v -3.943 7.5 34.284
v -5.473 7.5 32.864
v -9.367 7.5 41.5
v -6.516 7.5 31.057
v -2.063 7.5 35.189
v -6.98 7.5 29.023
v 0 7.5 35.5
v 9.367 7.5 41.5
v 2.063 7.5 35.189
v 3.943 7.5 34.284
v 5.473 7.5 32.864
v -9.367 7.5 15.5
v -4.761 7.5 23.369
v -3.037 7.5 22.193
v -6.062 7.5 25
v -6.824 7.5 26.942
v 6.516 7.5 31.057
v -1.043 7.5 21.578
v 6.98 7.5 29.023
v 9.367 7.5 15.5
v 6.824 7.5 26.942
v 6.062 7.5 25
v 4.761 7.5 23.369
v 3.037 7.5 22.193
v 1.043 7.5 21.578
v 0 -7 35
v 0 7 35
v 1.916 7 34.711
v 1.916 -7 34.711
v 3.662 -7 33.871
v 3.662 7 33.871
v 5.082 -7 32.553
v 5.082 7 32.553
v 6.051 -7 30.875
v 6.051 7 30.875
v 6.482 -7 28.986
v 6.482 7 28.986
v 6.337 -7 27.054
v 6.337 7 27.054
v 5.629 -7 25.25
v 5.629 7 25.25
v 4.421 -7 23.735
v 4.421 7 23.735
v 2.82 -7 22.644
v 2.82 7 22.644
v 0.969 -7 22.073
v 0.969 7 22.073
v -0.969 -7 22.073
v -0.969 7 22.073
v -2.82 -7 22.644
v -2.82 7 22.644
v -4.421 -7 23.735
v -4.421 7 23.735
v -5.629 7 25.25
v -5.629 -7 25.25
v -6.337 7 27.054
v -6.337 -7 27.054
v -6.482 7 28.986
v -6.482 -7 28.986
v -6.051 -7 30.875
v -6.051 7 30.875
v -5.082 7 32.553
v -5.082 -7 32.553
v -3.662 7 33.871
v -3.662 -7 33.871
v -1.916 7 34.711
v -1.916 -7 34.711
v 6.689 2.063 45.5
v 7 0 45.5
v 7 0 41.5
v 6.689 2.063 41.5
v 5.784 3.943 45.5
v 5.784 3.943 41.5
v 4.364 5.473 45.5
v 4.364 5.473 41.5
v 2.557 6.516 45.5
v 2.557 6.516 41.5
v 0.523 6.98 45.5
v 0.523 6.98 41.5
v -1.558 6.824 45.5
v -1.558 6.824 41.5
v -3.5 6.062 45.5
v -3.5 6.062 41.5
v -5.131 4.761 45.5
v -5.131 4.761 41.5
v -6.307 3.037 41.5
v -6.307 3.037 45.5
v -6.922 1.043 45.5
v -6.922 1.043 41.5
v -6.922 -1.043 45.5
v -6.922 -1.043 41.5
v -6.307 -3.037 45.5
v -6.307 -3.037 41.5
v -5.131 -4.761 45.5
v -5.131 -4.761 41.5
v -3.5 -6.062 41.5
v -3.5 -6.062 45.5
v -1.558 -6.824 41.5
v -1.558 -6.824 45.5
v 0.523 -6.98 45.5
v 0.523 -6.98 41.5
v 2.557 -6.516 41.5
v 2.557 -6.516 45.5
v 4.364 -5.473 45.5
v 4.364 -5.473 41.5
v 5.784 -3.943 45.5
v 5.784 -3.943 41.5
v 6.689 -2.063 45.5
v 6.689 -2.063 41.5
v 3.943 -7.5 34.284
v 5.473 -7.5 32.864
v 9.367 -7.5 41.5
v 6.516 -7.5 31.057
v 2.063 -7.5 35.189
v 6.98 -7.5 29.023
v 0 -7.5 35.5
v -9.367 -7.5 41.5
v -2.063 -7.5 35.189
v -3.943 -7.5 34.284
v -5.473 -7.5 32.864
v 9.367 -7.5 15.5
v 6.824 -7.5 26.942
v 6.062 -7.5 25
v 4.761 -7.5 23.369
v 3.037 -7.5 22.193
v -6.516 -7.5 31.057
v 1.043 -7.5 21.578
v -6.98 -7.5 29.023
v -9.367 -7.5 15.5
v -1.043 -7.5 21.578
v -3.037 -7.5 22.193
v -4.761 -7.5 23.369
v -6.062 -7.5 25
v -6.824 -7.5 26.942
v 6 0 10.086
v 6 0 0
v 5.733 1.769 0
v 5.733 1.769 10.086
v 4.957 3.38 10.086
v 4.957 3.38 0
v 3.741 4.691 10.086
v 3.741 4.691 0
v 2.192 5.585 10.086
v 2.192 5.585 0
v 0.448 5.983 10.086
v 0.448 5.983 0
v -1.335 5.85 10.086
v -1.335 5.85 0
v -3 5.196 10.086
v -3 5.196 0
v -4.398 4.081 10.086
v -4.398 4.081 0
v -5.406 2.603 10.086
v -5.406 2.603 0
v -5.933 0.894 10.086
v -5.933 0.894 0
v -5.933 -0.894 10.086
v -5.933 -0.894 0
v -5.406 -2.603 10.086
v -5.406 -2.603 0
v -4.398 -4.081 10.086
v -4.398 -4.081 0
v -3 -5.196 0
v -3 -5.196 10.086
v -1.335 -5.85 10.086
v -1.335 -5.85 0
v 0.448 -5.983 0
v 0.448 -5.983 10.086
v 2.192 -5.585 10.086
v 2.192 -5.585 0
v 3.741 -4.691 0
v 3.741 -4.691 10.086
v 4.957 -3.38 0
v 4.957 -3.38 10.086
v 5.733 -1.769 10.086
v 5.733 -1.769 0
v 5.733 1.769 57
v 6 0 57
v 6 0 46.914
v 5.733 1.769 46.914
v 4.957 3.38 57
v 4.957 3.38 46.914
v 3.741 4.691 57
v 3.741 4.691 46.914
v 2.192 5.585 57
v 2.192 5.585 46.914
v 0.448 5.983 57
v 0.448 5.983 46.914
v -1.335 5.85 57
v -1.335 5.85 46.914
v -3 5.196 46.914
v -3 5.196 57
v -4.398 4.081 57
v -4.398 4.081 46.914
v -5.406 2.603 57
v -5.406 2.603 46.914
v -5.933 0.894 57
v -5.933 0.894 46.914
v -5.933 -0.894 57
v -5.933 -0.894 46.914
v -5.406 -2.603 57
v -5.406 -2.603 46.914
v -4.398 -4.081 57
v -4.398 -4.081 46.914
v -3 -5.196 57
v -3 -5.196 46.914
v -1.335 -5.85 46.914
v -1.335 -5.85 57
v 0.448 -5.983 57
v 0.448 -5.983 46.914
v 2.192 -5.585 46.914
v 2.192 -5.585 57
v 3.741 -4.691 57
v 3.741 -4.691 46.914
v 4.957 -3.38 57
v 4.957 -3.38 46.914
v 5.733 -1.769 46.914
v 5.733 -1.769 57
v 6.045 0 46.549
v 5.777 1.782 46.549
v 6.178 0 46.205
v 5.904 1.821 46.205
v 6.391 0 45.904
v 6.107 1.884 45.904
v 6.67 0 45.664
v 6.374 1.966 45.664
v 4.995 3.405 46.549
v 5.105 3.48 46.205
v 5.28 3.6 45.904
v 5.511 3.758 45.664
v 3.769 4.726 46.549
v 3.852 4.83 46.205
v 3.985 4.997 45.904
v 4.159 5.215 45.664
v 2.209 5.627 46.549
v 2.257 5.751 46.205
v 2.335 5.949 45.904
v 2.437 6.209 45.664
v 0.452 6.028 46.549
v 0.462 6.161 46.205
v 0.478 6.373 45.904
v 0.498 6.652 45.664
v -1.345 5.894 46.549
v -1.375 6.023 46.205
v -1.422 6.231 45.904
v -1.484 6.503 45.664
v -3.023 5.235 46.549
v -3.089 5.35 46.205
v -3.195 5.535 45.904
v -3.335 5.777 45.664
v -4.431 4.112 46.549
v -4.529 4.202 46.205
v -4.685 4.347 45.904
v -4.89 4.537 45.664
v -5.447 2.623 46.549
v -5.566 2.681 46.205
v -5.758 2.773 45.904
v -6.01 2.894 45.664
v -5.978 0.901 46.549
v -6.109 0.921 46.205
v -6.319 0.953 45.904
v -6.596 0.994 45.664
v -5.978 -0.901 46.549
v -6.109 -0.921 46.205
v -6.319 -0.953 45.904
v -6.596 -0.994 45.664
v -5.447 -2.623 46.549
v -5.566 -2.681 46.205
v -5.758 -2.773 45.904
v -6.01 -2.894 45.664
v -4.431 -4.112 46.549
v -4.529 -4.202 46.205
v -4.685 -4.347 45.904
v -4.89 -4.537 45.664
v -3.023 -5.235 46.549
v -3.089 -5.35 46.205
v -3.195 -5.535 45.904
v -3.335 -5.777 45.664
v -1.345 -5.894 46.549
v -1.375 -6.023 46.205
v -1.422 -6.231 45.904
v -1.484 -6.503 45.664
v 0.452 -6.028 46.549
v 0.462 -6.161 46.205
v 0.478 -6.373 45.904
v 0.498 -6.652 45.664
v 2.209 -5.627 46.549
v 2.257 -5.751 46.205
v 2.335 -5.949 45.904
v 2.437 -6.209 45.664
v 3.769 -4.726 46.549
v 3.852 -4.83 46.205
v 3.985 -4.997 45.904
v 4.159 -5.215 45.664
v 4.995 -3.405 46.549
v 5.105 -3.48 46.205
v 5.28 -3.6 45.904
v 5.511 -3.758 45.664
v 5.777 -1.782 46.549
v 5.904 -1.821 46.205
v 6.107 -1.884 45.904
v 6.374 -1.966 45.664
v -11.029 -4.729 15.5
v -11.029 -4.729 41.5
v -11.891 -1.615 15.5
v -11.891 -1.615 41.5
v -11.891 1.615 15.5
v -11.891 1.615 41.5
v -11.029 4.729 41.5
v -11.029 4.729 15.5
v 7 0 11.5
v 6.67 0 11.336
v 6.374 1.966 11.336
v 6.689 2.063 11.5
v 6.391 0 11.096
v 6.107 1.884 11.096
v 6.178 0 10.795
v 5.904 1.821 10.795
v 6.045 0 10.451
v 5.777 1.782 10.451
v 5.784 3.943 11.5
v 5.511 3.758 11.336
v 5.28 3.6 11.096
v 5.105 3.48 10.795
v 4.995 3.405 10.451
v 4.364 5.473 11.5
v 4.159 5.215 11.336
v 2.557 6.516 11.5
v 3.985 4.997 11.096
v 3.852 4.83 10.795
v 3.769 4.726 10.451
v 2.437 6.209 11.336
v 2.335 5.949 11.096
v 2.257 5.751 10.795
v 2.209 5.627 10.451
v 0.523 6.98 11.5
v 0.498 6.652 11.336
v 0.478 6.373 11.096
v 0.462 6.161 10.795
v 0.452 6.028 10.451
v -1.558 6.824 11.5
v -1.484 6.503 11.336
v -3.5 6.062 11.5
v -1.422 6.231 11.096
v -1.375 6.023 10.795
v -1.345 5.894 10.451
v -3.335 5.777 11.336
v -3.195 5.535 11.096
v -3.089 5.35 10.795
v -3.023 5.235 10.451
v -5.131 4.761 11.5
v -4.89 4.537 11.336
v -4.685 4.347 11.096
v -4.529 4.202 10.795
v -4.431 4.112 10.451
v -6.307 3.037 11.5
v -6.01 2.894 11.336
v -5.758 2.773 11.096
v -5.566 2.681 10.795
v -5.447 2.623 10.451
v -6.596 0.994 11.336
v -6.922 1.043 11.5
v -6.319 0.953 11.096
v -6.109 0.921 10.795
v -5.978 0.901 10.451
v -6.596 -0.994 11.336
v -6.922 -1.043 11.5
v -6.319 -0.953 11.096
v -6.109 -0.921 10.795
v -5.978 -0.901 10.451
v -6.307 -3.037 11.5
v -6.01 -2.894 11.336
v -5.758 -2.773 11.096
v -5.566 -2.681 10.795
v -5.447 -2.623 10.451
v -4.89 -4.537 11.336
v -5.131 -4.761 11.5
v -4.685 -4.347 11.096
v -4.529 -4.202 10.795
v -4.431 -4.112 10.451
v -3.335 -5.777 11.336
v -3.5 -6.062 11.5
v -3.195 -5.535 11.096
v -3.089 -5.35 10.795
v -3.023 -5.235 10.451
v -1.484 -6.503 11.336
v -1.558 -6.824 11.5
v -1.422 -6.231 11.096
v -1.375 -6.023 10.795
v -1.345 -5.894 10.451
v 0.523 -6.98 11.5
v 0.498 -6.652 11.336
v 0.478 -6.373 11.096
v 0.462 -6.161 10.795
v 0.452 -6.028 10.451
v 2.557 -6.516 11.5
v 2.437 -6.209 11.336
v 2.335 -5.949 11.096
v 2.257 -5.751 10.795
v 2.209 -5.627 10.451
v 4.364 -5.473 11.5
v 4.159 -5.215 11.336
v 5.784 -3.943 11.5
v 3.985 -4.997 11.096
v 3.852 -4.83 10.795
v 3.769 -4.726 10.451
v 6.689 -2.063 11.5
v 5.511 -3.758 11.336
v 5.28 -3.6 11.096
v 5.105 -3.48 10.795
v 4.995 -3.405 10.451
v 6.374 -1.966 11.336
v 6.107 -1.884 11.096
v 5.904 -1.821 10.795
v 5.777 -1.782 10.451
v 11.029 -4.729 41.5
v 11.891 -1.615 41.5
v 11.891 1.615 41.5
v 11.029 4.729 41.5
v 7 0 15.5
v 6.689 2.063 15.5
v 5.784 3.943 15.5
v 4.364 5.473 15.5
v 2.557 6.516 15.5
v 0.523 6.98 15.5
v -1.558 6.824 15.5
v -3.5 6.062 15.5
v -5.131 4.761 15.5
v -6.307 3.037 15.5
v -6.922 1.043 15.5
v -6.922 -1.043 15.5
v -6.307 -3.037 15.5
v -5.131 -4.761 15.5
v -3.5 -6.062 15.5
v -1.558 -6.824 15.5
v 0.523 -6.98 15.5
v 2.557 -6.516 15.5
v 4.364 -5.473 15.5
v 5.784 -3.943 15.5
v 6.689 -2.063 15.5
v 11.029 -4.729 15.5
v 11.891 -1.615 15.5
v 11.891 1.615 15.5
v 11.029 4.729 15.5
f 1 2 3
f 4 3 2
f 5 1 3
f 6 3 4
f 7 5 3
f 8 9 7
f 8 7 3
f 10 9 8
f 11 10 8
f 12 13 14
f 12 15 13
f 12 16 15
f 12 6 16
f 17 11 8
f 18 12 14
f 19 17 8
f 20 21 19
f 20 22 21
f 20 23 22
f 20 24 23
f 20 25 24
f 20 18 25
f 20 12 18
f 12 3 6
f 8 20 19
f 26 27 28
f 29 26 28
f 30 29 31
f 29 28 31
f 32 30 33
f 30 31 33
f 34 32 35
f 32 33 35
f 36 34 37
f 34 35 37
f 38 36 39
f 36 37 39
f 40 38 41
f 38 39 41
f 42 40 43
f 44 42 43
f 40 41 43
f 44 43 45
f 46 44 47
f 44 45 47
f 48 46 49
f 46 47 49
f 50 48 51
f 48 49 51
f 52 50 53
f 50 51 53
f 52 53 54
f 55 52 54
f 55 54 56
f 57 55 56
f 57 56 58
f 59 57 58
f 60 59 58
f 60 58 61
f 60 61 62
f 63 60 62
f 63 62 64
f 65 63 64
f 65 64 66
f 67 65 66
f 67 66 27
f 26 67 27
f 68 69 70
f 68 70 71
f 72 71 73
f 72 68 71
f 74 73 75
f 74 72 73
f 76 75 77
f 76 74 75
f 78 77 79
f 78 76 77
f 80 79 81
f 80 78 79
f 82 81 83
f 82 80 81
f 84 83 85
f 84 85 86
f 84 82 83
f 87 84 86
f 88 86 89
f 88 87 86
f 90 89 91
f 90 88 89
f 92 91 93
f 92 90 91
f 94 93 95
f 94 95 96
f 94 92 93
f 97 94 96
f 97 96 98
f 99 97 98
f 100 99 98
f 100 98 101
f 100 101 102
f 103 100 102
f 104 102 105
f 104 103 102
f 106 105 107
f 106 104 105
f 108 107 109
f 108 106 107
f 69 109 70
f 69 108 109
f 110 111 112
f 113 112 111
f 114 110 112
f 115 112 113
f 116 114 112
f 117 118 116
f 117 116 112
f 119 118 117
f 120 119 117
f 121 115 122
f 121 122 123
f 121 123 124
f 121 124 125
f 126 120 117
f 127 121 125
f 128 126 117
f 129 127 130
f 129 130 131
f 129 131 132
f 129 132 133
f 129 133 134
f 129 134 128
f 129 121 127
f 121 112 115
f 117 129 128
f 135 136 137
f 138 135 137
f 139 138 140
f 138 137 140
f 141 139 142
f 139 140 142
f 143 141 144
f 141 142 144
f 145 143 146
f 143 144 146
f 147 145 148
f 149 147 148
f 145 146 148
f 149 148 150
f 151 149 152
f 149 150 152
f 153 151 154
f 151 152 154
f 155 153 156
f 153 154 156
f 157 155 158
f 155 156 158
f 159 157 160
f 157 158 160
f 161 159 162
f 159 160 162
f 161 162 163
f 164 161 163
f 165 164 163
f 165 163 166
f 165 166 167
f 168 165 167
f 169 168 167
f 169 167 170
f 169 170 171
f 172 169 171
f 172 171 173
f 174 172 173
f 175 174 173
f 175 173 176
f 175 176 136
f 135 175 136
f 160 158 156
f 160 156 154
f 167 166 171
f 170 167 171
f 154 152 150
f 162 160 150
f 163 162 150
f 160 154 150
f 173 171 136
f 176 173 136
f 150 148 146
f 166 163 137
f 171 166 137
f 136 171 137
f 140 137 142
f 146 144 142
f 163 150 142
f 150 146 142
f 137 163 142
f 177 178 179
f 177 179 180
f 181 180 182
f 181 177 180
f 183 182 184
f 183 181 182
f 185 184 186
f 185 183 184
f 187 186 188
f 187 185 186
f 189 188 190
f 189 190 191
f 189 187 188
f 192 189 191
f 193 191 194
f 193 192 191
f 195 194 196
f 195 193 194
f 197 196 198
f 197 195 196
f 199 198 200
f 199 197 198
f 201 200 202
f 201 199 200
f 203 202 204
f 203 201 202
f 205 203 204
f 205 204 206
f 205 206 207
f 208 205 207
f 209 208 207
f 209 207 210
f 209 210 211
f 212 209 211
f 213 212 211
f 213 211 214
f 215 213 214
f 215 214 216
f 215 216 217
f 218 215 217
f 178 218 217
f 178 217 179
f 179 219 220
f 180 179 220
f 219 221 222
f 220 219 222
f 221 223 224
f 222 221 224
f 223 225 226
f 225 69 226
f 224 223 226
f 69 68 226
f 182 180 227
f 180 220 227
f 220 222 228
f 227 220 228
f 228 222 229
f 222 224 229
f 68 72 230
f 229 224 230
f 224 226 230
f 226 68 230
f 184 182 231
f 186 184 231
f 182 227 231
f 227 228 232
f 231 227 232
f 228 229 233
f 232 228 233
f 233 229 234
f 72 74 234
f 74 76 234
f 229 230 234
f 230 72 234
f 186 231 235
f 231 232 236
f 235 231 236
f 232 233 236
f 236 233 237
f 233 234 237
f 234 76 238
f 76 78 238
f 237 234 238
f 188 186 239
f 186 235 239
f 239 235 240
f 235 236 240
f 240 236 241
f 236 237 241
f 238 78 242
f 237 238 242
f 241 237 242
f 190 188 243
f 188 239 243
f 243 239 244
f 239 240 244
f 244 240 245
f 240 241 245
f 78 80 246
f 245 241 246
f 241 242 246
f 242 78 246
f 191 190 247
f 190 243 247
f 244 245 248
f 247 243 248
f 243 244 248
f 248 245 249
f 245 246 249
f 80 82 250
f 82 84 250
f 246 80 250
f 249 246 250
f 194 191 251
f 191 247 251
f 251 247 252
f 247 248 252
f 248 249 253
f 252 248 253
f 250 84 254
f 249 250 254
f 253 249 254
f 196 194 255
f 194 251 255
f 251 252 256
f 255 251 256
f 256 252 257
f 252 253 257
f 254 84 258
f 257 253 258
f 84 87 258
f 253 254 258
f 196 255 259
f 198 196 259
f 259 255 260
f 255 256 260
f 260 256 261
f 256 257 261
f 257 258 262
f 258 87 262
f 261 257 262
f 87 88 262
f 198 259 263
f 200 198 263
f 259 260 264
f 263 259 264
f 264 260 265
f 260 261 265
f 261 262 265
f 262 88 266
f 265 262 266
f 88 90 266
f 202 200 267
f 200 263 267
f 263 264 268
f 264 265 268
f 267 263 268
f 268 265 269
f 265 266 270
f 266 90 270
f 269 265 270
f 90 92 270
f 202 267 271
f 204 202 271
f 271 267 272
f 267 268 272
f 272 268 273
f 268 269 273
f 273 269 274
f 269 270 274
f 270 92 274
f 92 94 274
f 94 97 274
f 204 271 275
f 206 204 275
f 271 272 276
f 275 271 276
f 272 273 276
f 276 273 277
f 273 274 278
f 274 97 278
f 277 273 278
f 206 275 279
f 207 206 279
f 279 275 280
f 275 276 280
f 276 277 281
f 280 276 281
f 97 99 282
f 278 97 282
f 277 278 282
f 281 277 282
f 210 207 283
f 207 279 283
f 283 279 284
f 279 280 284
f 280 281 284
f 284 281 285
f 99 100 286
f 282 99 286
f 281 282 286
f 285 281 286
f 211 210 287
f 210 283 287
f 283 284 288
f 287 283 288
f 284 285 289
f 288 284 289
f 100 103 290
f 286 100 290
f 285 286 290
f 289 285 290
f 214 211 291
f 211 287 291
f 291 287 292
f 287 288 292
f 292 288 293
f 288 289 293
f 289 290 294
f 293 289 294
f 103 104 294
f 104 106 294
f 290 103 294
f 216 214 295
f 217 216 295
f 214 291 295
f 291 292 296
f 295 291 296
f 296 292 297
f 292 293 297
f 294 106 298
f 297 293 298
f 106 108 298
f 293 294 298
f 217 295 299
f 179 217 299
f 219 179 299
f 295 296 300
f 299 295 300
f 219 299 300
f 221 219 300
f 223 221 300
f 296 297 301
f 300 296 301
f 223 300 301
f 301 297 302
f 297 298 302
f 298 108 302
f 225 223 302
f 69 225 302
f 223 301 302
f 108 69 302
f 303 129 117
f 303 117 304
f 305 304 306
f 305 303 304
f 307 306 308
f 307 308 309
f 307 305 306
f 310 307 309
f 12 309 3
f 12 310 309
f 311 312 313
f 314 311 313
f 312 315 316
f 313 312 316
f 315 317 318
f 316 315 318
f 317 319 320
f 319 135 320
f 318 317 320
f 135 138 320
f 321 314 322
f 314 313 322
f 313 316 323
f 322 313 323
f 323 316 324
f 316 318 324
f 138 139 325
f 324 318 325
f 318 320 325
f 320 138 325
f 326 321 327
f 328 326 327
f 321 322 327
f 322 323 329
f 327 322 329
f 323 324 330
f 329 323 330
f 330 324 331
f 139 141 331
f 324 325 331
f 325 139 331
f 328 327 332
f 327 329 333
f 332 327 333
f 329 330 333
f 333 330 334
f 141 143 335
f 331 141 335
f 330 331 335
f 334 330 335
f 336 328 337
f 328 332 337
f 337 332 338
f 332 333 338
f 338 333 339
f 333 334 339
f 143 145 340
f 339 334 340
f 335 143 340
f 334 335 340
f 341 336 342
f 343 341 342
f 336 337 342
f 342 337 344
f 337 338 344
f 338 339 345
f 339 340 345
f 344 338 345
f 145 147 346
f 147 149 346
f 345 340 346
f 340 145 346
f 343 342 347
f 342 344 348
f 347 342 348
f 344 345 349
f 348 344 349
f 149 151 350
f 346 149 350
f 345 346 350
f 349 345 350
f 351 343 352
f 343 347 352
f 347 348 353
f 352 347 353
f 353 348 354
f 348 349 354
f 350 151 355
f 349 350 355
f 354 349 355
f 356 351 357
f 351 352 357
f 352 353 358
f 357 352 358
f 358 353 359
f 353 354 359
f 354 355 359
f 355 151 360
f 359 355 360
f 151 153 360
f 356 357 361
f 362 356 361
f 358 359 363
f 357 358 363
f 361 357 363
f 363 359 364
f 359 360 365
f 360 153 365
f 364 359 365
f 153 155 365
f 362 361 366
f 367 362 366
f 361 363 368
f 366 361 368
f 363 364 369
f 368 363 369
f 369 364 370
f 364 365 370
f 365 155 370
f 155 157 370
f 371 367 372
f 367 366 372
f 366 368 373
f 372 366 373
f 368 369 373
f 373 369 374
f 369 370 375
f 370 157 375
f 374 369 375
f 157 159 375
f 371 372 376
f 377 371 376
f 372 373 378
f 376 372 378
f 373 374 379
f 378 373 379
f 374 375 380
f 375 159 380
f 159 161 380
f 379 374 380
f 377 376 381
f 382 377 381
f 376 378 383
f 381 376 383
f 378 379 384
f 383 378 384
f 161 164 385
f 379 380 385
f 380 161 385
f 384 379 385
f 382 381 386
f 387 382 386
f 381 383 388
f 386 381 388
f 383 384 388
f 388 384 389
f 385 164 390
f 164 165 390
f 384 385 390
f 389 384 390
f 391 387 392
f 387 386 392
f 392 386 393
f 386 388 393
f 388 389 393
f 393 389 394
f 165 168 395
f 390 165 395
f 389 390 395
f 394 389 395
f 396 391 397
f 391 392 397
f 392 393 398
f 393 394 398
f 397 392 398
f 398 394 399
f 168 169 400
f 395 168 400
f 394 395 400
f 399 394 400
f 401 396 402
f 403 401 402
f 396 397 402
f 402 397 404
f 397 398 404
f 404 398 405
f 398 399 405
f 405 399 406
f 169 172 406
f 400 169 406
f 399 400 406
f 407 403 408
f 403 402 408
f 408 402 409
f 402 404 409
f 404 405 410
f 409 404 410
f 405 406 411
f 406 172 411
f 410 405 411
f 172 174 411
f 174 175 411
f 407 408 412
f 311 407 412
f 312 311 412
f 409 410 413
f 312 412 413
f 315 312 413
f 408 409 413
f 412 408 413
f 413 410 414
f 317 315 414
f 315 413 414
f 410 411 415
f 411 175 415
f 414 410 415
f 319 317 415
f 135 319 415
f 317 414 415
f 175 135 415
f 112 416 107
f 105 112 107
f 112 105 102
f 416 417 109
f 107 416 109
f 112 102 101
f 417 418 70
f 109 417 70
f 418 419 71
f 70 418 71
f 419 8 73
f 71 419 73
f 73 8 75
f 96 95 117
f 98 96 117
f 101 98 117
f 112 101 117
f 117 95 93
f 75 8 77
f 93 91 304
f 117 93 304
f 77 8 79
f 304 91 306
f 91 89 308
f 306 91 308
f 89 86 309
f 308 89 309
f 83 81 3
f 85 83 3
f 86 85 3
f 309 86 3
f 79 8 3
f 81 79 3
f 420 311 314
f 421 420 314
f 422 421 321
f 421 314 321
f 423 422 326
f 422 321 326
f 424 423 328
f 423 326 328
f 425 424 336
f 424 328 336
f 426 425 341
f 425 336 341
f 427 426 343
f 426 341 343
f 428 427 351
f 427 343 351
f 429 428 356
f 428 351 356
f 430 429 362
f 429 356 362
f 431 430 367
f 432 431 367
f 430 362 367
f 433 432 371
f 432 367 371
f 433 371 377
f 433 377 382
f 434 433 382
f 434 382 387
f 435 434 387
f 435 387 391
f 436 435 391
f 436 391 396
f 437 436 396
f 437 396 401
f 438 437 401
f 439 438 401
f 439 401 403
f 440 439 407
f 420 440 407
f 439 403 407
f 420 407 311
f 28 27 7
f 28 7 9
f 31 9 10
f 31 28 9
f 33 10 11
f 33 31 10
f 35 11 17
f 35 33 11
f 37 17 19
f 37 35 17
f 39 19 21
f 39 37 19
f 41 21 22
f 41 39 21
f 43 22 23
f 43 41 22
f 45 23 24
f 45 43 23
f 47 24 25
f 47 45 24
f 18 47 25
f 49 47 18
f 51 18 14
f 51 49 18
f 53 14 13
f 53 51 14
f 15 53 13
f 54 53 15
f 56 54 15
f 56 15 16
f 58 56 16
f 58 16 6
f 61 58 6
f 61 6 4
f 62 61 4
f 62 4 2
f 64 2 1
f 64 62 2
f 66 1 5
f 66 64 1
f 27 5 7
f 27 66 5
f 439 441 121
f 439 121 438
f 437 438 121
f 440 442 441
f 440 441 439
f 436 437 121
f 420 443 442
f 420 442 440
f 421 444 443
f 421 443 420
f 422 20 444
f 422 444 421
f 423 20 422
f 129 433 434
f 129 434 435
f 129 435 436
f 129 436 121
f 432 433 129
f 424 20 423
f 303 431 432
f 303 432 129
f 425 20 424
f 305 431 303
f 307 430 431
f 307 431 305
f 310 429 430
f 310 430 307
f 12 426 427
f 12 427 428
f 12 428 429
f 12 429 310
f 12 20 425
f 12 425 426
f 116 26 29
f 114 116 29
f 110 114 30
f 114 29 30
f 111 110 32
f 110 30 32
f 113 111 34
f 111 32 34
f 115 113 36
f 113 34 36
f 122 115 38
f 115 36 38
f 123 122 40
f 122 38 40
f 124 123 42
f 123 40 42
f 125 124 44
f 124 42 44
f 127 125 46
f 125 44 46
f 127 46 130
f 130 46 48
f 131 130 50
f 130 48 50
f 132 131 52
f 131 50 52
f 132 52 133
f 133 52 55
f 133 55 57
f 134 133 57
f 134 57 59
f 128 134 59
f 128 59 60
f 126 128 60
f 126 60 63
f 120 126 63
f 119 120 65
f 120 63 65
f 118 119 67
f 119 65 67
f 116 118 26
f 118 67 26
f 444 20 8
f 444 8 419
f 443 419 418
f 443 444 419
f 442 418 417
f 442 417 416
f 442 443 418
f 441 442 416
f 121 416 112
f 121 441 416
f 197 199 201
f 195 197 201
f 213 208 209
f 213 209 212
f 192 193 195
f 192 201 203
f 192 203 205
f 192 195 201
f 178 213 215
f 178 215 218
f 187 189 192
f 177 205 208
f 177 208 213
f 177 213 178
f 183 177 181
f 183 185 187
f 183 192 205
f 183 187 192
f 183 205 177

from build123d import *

# Parameters (mm, degrees)
SCHIZZO2_R                   = 6
ESTRUSIONE_ESTRUSIONE1_DEPTH = 11.5
SCHIZZO3_R                   = 7
ESTRUSIONE_ESTRUSIONE2_DEPTH = 4
ESTRUSIONE_ESTRUSIONE3_DEPTH = 26
RACCORDO2_R                  = 1.5
SCHIZZO6_R                   = 6.5
TAGLIO_ESTRUSIONE2_DEPTH     = 61.149812967
SMUSSO2_SIZE                 = 0.5


with BuildPart() as part:
    # Schizzo2 → Estrusione-Estrusione1 (new body)
    with BuildSketch(Plane.XY):
        Circle(SCHIZZO2_R)
    estrusione_estrusione1 = extrude(amount=ESTRUSIONE_ESTRUSIONE1_DEPTH)

    # Schizzo3 → Estrusione-Estrusione2 (add)
    with BuildSketch(Plane.XY.offset(11.5)):
        Circle(SCHIZZO3_R)
    estrusione_estrusione2 = extrude(amount=ESTRUSIONE_ESTRUSIONE2_DEPTH)

    # Schizzo4 → Estrusione-Estrusione3 (add)
    with BuildSketch(Plane.XY.offset(15.5)):
        with BuildLine():
            Line((-9.367496998, 7.5), (9.367496998, 7.5))
            ThreePointArc((9.367496998, 7.5), (12, 0), (9.367496998, -7.5))
            Line((9.367496998, -7.5), (-9.367496998, -7.5))
            ThreePointArc((-9.367496998, -7.5), (-12, 0), (-9.367496998, 7.5))
        make_face()
    extrude(amount=ESTRUSIONE_ESTRUSIONE3_DEPTH)

    # Specchia1: Estrusione-Estrusione2 across plane
    add(estrusione_estrusione2.mirror(Plane.XY.offset(28.5)))

    # Specchia2: Estrusione-Estrusione1 across plane
    add(estrusione_estrusione1.mirror(Plane.XY.offset(28.5)))

    # Raccordo2
    # the kernel refuses this fillet: 1.5 mm, written as the material it adds along each edge
    with BuildSketch(Plane(origin=(0, 0, 45.5), x_dir=(1, 0, 0), z_dir=(0, -1, 0))) as raccordo2_piece_1:
        with BuildLine():
            CenterArc((7.5, 1.414213562), RACCORDO2_R, 180, 70.528779366)
            Line((6, 1.414213562), (5.97, 1.414213562))
            Line((5.97, 1.414213562), (5.97, 0))
            Line((5.97, 0), (6, -0.03))
            ThreePointArc((6, -0.03), (6.5, -0.03), (6.99, -0.028284271))
            Line((6.99, -0.028284271), (7, 0))
        make_face()
    revolve(axis=Axis((0, 0, 45.5), (0, 0, 1)))
    with BuildSketch(Plane(origin=(0, 0, 11.5), x_dir=(1, 0, 0), z_dir=(0, -1, 0))) as raccordo2_piece_2:
        with BuildLine():
            CenterArc((7.5, -1.414213562), RACCORDO2_R, 109.471220634, 70.528779366)
            Line((6, -1.414213562), (5.97, -1.414213562))
            Line((5.97, -1.414213562), (5.97, 0))
            Line((5.97, 0), (6, 0.03))
            ThreePointArc((6, 0.03), (6.5, 0.03), (6.99, 0.028284271))
            Line((6.99, 0.028284271), (7, 0))
        make_face()
    revolve(axis=Axis((0, 0, 11.5), (0, 0, 1)))

    # Schizzo6 → Taglio-Estrusione2 (cut, through all)
    with BuildSketch(Plane(origin=(0, 7.5, 0), x_dir=(1, 0, 0), z_dir=(0, 1, 0))):
        with Locations(Location((0, -28.5, 0), (0, 0, 270))):
            Circle(SCHIZZO6_R)
    extrude(amount=-TAGLIO_ESTRUSIONE2_DEPTH, mode=Mode.SUBTRACT)

    # Smusso2
    smusso2_edges = [part.edges().sort_by_distance(p)[0] for p in [
        (0, -7.5, 22),
        (0, 7.5, 22),
    ]]
    chamfer(smusso2_edges, length=SMUSSO2_SIZE)


solid = part.part
